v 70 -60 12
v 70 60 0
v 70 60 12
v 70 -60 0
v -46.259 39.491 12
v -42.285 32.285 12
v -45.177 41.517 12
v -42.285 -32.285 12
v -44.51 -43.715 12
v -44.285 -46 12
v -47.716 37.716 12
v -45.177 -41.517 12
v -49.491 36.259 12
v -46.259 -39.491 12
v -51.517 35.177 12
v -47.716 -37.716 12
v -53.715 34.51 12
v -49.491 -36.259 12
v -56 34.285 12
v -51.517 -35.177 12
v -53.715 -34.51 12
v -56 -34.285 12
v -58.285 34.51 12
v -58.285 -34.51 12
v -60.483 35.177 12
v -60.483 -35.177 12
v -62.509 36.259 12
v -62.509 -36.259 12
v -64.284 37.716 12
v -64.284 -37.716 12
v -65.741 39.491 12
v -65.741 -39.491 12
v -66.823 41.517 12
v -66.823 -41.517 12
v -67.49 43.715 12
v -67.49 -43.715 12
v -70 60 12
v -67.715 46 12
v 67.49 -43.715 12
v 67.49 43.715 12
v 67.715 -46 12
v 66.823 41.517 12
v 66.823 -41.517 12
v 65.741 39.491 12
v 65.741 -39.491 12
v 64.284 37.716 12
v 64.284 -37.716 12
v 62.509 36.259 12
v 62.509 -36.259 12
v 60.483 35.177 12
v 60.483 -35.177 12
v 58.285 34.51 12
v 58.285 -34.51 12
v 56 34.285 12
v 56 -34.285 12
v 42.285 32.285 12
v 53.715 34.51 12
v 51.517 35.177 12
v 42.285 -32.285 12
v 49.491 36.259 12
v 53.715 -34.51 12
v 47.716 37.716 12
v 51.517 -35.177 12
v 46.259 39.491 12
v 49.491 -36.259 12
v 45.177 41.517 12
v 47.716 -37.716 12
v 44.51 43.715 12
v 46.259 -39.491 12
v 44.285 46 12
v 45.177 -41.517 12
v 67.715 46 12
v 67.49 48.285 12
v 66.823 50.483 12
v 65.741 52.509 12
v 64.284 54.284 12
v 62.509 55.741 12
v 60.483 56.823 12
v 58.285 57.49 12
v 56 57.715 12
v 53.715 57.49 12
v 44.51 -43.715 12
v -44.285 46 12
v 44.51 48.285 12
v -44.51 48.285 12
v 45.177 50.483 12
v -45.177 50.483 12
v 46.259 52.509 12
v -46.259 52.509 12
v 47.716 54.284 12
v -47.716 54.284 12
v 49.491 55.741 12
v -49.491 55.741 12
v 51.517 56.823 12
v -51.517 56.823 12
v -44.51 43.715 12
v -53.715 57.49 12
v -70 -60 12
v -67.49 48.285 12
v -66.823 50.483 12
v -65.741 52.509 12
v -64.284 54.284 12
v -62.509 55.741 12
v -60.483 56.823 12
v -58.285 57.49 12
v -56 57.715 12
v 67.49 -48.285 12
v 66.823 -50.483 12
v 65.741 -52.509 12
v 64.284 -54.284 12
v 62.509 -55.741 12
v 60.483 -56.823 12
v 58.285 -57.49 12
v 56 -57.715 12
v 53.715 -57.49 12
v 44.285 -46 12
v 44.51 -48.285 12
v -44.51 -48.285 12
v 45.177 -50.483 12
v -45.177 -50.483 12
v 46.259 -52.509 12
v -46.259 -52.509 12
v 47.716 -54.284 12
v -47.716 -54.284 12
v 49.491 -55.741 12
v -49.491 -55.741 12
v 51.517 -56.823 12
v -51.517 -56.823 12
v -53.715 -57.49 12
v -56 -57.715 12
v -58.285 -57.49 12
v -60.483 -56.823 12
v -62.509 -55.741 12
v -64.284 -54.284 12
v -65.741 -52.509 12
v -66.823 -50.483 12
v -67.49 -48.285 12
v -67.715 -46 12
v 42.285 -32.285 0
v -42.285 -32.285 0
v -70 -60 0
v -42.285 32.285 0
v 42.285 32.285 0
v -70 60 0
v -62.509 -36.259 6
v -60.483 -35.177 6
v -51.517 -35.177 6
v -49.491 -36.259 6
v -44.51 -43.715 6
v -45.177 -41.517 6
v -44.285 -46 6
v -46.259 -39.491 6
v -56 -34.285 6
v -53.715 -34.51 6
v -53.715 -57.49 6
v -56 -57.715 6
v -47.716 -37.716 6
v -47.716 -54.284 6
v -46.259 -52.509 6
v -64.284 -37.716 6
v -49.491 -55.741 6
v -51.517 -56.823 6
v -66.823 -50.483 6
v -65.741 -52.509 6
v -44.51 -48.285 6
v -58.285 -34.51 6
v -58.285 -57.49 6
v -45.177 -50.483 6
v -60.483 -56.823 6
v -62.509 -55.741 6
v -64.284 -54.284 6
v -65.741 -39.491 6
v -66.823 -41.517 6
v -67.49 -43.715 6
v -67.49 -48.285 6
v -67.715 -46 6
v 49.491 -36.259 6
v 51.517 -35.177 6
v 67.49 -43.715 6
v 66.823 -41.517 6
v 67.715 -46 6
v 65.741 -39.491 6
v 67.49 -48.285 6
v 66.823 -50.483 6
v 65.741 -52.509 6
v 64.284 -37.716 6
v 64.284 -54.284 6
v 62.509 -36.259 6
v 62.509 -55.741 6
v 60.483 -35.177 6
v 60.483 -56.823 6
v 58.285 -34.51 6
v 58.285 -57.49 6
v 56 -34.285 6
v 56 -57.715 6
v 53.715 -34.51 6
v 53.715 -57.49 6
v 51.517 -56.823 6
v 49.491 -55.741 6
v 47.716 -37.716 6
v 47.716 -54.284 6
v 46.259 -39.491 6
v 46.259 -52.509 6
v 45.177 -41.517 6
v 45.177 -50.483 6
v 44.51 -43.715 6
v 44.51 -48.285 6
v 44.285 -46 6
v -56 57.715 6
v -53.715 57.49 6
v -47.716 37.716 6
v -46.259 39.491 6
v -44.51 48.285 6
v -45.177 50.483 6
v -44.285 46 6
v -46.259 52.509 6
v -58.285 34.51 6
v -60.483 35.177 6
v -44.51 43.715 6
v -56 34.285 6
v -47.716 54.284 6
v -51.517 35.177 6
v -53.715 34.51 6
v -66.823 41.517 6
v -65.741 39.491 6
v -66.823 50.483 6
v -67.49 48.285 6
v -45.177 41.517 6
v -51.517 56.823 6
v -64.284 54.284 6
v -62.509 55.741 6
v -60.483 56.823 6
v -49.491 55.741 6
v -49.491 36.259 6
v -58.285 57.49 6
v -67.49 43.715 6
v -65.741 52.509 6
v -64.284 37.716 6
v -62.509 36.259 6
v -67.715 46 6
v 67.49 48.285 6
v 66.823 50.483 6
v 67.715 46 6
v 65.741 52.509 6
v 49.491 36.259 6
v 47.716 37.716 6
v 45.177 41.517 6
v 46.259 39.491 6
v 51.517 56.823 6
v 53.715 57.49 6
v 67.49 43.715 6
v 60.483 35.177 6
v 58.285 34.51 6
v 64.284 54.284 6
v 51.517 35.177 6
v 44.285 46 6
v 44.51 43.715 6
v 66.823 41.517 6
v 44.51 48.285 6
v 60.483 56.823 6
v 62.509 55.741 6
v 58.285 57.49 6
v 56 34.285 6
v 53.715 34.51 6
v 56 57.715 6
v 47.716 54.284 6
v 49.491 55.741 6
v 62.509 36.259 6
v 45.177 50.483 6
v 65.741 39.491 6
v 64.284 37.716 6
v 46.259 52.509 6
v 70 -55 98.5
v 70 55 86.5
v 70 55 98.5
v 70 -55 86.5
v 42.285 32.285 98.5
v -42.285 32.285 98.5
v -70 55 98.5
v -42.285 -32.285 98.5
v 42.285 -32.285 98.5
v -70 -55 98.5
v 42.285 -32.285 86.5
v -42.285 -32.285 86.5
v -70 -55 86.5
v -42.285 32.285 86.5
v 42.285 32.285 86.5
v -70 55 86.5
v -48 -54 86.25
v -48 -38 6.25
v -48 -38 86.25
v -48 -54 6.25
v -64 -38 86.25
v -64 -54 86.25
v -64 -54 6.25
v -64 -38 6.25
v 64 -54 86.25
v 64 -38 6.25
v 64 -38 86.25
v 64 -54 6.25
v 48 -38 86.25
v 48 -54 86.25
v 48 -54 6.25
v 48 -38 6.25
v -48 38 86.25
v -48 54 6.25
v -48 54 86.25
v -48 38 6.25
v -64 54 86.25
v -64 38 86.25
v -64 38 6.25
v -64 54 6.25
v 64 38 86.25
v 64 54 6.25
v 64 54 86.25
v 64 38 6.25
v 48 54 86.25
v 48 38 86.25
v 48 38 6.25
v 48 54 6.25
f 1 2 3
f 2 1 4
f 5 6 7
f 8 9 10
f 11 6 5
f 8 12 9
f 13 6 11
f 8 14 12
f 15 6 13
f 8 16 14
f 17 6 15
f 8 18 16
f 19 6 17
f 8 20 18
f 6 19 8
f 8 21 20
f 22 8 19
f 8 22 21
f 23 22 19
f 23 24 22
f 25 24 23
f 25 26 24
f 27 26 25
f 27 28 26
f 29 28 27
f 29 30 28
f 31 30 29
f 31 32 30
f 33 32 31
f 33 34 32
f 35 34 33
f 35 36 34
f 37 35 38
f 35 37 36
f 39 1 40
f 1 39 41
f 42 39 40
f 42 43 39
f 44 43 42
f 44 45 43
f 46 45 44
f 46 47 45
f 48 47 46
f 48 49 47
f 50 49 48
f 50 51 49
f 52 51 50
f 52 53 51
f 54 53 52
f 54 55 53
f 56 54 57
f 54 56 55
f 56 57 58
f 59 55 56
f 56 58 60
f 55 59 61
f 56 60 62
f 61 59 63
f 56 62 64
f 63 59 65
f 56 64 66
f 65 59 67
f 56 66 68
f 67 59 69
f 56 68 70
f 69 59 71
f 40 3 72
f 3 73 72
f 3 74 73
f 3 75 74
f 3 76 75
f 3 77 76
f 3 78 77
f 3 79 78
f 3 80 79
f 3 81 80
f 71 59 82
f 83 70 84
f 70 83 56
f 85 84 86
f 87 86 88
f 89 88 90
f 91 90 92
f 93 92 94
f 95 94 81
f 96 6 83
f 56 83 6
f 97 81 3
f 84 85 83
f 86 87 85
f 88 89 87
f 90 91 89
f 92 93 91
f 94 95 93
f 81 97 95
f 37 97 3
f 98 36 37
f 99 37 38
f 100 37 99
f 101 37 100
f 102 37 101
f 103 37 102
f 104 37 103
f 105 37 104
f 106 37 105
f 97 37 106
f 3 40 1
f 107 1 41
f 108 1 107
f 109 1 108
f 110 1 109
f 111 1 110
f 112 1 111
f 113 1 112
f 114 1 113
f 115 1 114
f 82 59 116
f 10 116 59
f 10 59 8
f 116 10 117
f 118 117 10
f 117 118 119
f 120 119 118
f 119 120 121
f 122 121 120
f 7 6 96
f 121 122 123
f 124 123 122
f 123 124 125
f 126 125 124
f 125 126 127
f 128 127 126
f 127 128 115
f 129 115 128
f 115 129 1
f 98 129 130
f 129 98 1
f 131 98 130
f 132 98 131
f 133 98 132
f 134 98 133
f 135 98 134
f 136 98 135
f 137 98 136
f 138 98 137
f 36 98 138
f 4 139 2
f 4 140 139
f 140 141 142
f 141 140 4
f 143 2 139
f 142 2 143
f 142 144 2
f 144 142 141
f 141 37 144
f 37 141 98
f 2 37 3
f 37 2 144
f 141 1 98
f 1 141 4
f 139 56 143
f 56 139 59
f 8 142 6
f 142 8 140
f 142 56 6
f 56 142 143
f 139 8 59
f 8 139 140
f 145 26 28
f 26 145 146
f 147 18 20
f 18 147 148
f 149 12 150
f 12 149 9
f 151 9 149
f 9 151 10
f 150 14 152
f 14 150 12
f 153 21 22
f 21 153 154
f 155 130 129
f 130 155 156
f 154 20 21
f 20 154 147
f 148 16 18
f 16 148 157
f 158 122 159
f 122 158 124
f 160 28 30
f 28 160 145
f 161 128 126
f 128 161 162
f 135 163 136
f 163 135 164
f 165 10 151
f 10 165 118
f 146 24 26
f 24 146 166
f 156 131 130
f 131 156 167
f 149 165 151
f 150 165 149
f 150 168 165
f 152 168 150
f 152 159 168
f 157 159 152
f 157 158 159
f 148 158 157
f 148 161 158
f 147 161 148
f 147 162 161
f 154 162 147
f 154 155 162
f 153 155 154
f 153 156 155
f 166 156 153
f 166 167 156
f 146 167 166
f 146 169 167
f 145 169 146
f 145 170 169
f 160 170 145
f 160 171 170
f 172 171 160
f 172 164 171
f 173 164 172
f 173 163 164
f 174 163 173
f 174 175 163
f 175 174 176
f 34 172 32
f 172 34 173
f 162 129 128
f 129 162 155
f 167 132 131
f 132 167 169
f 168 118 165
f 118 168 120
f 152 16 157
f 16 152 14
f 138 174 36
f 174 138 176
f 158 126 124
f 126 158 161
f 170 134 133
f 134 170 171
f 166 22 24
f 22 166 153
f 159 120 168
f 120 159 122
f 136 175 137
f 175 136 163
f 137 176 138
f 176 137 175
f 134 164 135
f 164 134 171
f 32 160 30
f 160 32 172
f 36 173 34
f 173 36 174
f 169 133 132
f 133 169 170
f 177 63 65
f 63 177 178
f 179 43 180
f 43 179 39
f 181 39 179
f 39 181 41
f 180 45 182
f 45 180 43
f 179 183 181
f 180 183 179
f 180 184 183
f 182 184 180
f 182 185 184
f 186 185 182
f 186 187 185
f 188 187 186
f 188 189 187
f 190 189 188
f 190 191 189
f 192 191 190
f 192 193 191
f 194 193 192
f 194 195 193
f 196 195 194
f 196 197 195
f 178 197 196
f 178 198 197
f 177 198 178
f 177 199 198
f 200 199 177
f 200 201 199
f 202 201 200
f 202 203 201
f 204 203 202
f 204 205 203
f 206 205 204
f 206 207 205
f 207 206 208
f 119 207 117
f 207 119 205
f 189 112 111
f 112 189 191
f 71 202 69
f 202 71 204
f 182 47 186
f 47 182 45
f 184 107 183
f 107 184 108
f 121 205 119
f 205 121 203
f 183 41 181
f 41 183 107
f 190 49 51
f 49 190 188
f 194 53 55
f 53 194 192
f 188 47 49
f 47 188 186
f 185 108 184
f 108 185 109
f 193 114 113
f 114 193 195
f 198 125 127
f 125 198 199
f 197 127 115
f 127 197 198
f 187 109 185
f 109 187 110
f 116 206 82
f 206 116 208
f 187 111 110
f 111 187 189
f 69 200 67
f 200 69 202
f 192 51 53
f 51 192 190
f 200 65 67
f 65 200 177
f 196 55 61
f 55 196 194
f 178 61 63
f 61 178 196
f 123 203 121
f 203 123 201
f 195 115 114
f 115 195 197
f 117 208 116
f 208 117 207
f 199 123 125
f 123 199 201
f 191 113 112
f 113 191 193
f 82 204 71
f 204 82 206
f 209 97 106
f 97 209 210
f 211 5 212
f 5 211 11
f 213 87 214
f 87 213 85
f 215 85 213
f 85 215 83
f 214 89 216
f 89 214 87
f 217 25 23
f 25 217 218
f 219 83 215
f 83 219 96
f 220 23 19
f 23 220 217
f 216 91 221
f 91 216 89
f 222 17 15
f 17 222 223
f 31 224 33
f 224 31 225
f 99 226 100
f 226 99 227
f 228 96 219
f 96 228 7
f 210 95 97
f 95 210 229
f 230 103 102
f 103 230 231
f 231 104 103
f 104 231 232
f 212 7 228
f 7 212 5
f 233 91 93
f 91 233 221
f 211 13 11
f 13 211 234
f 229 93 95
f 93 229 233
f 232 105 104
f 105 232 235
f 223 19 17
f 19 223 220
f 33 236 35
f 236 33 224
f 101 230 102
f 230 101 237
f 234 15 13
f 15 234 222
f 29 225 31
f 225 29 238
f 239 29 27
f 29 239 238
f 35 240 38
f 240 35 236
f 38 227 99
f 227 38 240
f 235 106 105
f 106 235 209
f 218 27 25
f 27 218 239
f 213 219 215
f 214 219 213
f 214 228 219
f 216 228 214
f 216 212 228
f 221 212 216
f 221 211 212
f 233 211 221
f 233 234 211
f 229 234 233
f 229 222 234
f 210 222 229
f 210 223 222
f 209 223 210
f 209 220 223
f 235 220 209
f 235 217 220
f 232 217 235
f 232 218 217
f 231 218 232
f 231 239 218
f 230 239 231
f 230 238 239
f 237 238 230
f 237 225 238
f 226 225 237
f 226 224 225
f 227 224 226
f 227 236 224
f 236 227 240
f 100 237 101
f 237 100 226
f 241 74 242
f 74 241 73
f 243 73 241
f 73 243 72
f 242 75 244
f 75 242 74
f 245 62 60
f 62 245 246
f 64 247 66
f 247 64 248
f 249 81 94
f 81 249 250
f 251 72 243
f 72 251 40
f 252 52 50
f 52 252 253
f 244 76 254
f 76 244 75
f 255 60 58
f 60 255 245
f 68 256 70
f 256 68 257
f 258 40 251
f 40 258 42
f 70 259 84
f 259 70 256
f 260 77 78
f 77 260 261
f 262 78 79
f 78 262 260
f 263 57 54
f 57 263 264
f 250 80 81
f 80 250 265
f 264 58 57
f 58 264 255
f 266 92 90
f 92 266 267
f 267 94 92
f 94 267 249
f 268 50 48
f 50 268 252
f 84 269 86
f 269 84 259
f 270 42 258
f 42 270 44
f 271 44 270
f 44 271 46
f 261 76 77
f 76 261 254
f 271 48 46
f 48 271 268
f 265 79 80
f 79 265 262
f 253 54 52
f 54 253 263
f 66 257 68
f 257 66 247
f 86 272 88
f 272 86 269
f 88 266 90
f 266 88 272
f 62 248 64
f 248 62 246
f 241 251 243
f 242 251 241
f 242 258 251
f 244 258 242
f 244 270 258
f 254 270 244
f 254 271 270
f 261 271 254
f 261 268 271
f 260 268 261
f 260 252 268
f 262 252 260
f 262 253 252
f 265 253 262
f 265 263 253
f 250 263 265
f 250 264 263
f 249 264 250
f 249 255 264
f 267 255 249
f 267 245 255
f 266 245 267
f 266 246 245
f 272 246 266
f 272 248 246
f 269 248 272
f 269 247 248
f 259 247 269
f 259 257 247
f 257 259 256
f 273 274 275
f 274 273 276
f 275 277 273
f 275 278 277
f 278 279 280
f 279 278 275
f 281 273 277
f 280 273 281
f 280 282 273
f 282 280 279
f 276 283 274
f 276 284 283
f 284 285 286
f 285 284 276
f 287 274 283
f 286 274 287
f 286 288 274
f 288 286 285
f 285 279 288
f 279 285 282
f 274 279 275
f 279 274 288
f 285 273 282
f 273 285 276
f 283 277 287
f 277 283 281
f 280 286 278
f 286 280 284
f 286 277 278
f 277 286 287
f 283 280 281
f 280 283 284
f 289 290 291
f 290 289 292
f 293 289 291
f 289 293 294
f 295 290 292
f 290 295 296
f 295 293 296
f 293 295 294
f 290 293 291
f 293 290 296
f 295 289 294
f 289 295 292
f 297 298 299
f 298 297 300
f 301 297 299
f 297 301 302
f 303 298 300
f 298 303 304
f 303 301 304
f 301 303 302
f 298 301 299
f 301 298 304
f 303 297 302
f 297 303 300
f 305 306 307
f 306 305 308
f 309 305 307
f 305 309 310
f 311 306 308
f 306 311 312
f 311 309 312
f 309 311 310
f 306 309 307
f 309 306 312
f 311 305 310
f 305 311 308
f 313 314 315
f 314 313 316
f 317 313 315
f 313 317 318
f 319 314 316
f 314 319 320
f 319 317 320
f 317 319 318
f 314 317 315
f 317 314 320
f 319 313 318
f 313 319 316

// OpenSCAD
$fn = 32;

// ------------------------------------------------------------------------
// Frame cube: base 140 x 120 mm, posts 80 mm tall
// Every part is its own module, assembly() places every instance.
// ------------------------------------------------------------------------

// --- part 1 ---
module base_frame() {
  difference() {
    translate([-70, -60, 0]) cube([140, 120, 12]);
    translate([-42.285, -32.285, -1]) cube([84.57, 64.57, 14]);
    translate([-56, -46, 6]) cylinder(h = 7, d = 23.43);
    translate([56, -46, 6]) cylinder(h = 7, d = 23.43);
    translate([-56, 46, 6]) cylinder(h = 7, d = 23.43);
    translate([56, 46, 6]) cylinder(h = 7, d = 23.43);
  }
}

// --- part 2 ---
module corner_post() {
  translate([-8, -8, 0]) cube([16, 16, 80]);
}

// --- part 3 ---
module top_frame() {
  difference() {
    translate([-70, -55, 0]) cube([140, 110, 12]);
    translate([-42.285, -32.285, -1]) cube([84.57, 64.57, 14]);
  }
}

// --- assembly ---
module assembly() {
  color([0.80, 0.24, 0.20]) translate([0, 0, 0]) rotate([0, 0, 0]) base_frame();
  color([0.20, 0.45, 0.75]) translate([-56, -46, 6.25]) rotate([0, 0, 0]) corner_post();
  color([0.25, 0.62, 0.32]) translate([56, -46, 6.25]) rotate([0, 0, 0]) corner_post();
  color([0.92, 0.70, 0.18]) translate([-56, 46, 6.25]) rotate([0, 0, 0]) corner_post();
  color([0.58, 0.35, 0.70]) translate([56, 46, 6.25]) rotate([0, 0, 0]) corner_post();
  color([0.16, 0.66, 0.66]) translate([0, 0, 86.5]) rotate([0, 0, 0]) top_frame();
}

assembly();
